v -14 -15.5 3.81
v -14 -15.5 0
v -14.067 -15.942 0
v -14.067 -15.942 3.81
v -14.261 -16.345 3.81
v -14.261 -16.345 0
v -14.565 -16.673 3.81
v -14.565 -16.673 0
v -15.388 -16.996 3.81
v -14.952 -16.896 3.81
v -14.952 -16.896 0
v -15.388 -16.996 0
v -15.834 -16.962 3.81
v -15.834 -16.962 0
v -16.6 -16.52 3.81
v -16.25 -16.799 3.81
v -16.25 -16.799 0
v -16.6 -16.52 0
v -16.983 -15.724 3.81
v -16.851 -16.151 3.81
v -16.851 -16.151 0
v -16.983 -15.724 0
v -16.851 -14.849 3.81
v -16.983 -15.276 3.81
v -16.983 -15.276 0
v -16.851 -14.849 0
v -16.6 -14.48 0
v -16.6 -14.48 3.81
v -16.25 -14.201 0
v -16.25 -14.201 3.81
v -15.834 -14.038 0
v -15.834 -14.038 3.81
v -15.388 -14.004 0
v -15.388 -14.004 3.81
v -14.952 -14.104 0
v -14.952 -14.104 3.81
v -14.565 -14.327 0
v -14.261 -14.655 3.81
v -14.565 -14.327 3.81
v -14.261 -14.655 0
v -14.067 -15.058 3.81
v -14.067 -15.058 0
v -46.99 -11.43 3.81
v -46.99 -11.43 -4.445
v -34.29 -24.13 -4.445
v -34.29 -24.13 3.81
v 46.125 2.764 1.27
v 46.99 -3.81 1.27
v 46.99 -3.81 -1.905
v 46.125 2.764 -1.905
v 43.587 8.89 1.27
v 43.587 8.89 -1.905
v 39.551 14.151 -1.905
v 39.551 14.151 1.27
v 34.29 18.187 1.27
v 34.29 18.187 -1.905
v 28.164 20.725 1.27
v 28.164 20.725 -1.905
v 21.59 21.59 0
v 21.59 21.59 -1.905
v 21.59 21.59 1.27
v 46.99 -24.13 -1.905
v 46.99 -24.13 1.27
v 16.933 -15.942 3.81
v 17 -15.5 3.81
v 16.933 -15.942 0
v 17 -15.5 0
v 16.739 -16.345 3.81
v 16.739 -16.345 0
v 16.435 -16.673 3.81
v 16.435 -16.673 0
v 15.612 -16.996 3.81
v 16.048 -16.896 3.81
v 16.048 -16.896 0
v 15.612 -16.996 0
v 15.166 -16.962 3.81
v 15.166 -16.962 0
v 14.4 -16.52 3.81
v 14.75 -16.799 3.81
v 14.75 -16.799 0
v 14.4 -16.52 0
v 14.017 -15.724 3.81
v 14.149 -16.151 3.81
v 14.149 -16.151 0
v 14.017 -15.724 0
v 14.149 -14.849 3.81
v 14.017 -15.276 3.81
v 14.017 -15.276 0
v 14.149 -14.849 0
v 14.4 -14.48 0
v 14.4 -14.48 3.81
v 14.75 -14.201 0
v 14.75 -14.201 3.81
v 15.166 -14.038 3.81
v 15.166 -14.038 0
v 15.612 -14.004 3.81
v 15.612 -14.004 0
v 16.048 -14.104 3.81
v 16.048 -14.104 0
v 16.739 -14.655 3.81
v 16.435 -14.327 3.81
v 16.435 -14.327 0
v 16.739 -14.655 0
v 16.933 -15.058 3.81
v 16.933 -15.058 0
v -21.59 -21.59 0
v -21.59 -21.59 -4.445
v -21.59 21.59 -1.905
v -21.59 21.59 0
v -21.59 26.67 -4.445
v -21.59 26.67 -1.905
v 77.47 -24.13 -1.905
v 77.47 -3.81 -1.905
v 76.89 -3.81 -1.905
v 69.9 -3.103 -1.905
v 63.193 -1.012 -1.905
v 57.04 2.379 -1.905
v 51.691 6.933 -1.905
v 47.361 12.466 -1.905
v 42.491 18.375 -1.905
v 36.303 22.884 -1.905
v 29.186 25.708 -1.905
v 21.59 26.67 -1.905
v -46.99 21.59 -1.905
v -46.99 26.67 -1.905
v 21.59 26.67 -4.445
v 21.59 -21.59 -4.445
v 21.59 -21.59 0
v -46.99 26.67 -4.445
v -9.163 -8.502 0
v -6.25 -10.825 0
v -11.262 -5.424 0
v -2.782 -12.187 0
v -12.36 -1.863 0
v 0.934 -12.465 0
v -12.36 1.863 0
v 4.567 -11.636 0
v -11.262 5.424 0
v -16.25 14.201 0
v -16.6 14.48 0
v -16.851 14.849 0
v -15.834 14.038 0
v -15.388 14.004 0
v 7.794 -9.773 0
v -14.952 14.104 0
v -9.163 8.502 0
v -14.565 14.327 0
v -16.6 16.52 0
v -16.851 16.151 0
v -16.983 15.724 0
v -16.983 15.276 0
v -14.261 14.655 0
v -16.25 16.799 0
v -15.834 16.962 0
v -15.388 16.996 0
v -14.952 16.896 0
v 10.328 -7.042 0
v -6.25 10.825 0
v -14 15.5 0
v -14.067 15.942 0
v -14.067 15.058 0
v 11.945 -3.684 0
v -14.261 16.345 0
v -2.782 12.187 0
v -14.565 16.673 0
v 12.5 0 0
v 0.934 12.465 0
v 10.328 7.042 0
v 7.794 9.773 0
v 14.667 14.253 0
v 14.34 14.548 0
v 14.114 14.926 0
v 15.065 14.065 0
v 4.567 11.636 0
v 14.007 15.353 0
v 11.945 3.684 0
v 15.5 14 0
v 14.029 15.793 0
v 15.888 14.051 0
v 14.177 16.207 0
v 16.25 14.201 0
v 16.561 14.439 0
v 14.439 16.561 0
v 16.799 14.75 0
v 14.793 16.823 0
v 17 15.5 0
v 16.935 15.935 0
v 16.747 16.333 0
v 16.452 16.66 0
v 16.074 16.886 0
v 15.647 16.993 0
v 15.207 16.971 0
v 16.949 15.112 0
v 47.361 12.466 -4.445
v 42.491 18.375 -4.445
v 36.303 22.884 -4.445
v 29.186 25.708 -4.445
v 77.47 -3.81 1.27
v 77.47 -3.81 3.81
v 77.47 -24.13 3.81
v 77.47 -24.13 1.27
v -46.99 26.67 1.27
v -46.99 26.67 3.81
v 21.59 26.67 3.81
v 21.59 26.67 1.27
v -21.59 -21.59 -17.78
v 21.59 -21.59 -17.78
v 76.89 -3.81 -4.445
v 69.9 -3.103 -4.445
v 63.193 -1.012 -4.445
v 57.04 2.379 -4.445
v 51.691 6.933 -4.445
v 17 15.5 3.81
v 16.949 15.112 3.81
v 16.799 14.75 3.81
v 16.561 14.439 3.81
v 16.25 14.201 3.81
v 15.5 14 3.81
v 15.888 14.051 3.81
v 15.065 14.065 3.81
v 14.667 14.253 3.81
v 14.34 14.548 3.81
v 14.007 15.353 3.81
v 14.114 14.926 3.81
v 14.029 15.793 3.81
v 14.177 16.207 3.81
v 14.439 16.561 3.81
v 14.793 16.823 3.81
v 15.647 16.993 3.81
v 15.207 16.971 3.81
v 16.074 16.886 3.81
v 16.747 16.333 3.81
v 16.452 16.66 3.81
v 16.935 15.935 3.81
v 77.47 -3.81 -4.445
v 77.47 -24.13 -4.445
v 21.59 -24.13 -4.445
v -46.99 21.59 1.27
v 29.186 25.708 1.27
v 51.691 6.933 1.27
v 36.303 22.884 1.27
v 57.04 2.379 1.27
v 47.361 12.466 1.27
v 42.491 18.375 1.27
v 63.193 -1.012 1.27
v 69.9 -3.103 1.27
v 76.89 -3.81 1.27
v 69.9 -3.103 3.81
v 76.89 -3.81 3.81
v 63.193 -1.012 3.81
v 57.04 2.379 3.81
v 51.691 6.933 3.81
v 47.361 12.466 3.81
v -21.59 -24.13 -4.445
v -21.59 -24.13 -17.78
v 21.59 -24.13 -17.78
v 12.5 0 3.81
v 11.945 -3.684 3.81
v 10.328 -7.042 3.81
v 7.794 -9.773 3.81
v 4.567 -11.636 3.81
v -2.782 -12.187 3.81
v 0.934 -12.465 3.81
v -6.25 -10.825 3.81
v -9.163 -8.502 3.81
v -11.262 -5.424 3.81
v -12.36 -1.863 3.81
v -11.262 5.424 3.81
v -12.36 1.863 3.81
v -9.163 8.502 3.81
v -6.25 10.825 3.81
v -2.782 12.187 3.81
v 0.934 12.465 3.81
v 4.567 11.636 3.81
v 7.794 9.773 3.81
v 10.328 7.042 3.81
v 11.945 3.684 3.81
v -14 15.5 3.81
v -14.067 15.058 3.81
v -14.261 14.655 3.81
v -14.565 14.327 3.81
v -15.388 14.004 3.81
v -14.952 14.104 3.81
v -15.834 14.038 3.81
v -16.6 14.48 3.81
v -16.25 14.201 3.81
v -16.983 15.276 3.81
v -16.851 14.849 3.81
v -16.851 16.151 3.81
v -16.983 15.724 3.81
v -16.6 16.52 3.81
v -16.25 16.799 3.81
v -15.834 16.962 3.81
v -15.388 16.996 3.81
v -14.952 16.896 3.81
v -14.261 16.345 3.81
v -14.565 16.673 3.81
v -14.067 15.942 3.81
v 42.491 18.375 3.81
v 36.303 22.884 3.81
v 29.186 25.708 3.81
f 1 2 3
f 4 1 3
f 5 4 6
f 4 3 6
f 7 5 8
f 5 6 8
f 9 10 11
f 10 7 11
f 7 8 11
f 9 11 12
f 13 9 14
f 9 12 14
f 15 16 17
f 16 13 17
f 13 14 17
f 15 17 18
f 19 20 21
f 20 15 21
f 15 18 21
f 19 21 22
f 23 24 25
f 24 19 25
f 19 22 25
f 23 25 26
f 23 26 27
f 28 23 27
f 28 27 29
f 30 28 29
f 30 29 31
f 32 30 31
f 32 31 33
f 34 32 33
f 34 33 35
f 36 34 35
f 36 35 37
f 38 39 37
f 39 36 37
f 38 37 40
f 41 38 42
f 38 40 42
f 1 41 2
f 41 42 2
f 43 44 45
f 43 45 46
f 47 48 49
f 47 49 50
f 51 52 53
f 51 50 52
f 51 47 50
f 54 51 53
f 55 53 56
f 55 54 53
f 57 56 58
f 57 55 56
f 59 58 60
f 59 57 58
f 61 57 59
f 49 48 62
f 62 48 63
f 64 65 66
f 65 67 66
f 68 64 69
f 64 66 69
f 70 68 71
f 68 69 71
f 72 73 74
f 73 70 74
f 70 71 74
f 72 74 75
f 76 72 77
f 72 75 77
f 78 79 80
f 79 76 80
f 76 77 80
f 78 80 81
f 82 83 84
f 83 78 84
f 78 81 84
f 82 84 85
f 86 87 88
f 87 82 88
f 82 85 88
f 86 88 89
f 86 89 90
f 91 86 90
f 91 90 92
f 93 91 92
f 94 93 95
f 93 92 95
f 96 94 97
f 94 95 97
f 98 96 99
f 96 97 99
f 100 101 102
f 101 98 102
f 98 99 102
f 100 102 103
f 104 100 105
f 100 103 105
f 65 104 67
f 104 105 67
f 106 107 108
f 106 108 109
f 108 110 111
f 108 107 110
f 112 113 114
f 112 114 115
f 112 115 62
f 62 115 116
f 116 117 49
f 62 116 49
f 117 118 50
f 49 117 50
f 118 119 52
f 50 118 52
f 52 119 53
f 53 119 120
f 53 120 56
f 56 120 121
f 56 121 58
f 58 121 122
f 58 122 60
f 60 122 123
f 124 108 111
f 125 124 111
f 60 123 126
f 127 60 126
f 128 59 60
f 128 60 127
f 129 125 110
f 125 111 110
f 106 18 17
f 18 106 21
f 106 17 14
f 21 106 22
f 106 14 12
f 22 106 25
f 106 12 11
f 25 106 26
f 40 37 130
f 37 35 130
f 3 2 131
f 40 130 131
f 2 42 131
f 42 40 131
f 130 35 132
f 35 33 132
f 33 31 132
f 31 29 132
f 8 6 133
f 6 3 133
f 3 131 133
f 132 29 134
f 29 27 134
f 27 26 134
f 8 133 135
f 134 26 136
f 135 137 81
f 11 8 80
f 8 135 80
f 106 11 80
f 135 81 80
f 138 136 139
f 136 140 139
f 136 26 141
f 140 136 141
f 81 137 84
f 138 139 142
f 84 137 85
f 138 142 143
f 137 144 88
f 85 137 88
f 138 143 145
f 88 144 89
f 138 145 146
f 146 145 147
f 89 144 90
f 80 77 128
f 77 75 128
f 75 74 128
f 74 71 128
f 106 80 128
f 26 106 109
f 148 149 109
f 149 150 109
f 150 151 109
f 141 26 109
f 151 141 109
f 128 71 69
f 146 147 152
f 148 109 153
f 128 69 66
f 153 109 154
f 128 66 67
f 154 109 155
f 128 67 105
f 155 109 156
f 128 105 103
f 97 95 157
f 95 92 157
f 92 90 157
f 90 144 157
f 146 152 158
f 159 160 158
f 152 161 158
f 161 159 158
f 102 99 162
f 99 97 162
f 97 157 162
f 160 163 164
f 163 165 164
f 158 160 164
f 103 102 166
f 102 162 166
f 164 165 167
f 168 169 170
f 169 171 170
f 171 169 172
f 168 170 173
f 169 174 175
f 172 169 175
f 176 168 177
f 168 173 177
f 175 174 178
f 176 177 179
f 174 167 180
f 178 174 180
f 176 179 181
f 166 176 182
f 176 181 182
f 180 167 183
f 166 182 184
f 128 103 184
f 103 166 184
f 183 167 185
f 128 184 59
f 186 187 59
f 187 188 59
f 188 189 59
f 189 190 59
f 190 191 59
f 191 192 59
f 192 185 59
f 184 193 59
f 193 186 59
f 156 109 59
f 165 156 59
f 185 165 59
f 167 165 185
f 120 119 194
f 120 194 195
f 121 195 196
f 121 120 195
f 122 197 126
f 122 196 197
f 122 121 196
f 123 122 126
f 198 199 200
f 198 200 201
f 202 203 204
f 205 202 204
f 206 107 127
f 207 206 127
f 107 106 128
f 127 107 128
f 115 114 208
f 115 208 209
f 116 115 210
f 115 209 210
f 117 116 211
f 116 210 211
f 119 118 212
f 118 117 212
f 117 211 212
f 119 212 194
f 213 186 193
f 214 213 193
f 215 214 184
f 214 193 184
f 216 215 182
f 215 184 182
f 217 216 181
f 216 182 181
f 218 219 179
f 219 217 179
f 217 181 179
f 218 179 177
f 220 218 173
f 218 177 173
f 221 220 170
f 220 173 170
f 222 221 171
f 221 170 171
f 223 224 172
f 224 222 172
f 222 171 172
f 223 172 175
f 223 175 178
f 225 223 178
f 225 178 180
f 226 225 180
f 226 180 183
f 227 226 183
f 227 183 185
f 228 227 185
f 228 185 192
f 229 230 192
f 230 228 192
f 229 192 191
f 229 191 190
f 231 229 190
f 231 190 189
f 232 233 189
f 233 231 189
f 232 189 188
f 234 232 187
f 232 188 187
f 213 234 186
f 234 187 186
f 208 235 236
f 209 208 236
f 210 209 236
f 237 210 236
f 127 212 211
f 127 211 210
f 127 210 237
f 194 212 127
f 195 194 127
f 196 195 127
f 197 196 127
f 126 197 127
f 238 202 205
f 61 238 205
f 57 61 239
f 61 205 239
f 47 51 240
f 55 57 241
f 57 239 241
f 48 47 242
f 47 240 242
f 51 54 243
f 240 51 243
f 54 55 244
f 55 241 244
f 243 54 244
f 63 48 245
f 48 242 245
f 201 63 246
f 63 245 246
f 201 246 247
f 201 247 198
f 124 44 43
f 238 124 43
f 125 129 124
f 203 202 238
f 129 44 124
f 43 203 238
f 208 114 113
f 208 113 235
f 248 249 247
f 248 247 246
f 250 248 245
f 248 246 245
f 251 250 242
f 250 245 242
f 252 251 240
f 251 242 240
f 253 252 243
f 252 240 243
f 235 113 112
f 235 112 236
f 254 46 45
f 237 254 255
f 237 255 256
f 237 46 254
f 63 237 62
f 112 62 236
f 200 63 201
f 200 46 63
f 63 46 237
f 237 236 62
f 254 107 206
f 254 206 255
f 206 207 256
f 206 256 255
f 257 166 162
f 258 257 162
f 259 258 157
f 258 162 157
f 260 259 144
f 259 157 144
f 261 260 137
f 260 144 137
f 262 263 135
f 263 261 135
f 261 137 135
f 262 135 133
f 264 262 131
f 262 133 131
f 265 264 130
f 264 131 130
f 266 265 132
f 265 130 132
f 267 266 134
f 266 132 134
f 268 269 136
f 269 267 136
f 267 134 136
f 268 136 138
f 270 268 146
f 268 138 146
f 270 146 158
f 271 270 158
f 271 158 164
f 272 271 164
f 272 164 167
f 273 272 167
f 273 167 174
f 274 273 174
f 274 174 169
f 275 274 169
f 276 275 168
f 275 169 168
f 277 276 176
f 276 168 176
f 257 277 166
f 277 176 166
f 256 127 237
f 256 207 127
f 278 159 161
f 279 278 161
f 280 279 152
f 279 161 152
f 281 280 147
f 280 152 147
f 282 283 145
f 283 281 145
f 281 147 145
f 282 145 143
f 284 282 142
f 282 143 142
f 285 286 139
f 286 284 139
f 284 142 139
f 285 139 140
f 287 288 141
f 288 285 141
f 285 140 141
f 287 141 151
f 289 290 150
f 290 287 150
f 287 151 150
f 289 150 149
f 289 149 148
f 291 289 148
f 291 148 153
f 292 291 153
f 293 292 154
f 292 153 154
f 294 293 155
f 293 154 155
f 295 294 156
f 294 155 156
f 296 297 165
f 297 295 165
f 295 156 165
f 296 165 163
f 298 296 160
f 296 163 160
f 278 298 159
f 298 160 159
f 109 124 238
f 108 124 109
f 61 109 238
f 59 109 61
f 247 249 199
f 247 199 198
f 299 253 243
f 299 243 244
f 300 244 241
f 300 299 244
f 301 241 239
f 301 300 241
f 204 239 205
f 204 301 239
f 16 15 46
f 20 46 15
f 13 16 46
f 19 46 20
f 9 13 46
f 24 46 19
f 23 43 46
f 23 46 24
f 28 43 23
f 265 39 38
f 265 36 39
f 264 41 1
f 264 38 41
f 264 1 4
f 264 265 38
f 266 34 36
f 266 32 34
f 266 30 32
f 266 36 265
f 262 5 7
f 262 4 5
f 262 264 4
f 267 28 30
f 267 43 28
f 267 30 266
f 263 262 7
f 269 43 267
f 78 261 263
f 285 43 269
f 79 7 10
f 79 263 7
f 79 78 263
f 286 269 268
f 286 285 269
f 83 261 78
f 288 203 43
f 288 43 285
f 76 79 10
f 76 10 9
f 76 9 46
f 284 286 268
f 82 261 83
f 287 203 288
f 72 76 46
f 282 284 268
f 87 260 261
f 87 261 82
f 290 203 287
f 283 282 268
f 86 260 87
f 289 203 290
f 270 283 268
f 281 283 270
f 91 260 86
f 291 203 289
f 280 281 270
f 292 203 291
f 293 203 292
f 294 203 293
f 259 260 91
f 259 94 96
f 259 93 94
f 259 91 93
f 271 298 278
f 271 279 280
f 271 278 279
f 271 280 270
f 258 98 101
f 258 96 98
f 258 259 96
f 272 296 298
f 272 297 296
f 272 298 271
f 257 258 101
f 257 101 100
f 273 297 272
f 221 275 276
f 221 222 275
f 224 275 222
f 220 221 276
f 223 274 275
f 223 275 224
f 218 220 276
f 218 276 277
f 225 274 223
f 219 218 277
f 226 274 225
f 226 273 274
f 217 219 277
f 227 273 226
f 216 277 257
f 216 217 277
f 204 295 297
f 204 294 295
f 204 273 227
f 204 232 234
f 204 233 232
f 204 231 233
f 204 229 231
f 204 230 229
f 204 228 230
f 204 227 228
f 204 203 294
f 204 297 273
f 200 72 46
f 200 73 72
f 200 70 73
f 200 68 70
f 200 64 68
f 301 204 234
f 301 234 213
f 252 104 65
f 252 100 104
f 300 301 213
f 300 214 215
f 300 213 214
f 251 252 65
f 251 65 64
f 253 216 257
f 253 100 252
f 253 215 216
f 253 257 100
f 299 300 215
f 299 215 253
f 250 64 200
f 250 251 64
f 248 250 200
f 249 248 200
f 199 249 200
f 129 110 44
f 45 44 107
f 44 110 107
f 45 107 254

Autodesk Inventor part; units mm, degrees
ref_plane "YZ Plane" through (0, 0, 0) normal (1, 0, 0) x (0, 1, 0)
ref_plane "XZ Plane" through (0, 0, 0) normal (0, 1, 0) x (-1, 0, 0)
ref_plane "XY Plane" through (0, 0, 0) normal (0, 0, 1) x (1, 0, 0)
sketch "Sketch1" plane through (0, 0, 0) normal (0, 0, 1) x (1, 0, 0)
  circle A0 centre (0, 0) radius 12.5
  line L0 (0, 0) -> (15.5, 0)
  line L1 (0, 0) -> (15.5, 0) construction
  line L2 (15.5, 0) -> (15.5, 15.5)
  circle A1 centre (15.5, 15.5) radius 1.5
  circle A2 centre (-15.5, 15.5) radius 1.5
  circle A3 centre (15.5, -15.5) radius 1.5
  circle A4 centre (-15.5, -15.5) radius 1.5
  line L3 (21.59, -21.59) -> (-21.59, -21.59)
  line L4 (-21.59, -21.59) -> (-21.59, 21.59)
  line L5 (-21.59, 21.59) -> (21.59, 21.59)
  line L6 (21.59, 21.59) -> (21.59, -21.59)
  line L7 (21.59, -21.59) -> (-21.59, 21.59) construction
  line L8 (-21.59, -21.59) -> (21.59, 21.59) construction
  dimension "d0" = 25
  dimension "d1" = 15.5
  dimension "d2" = 0
  dimension "d3" = 15.5
  dimension "d4" = 3
  dimension "d7" = 31
  dimension "d10" = 31
  dimension "d13" = 43.18
  dimension "d14" = 43.18
extrude "Extrusion1" add sketch "Sketch1" along normal blind 3.81
sketch "Sketch2" plane through (-21.59, -21.59, 0) normal (0, -1, 0) x (1, 0, 0)
  line L0 (0, 3.81) -> (43.18, 3.81) projected
  line L1 (0, 3.81) -> (43.18, 3.81)
  line L2 (43.18, 3.81) -> (43.18, -17.78)
  line L3 (43.18, -17.78) -> (0, -17.78)
  line L4 (0, -17.78) -> (0, 3.81)
  point P0 (21.59, 0)
  dimension "d17" = 21.59
extrude "Extrusion2" add sketch "Sketch2" along normal blind 2.54
sketch "Sketch3" plane through (0, 0, 3.81) normal (0, 0, 1) x (1, 0, 0)
  line L0 (-21.59, 21.59) -> (21.59, 21.59) projected
  circle A0 centre (0, 0) radius 12.5 projected
  circle A1 centre (-15.5, -15.5) radius 1.5 projected
  circle A2 centre (15.5, -15.5) radius 1.5 projected
  circle A3 centre (-15.5, 15.5) radius 1.5 projected
  circle A4 centre (15.5, 15.5) radius 1.5 projected
  line L1 (21.59, 21.59) -> (21.59, -24.13) projected
  line L2 (21.59, 21.59) -> (-21.59, 21.59) projected
  line L3 (-21.59, 21.59) -> (-21.59, -24.13) projected
  line L4 (21.59, -24.13) -> (-21.59, -24.13) projected
  line L5 (-21.59, 26.67) -> (21.59, 26.67)
  arc A5 (52.07, -3.81) -> (21.59, 26.67) centre (21.59, -3.81) ccw
  line L6 (52.07, -3.81) -> (52.07, -24.13)
  line L7 (-21.59, 26.67) -> (-21.59, 21.59)
  line L8 (-21.59, 21.59) -> (21.59, 21.59)
  line L9 (21.59, 21.59) -> (21.59, -21.59) projected
  line L10 (21.59, 21.59) -> (21.59, -24.13)
  line L11 (21.59, 21.59) -> (21.59, -24.13) projected
  line L12 (21.59, -24.13) -> (52.07, -24.13)
extrude "Extrusion3" add sketch "Sketch3" against normal blind 2.54 contours L7 L5 A5 L6 L12 L1 L0
sketch "Sketch4" plane through (0, 0, 1.27) normal (0, 0, -1) x (-1, 0, 0)
  line L0 (-21.59, 21.59) -> (-21.59, -24.13) projected
  line L1 (-21.59, -24.13) -> (-46.99, -24.13)
  arc A0 (-21.59, 26.67) -> (-52.07, -3.81) centre (-21.59, -3.81) ccw projected
  arc A1 (-21.59, 21.59) -> (-46.99, -3.81) centre (-21.59, -3.81) ccw
  line L2 (-46.99, -3.81) -> (-46.99, -24.13)
  line L3 (-21.59, 21.59) -> (-21.59, -24.13)
  line L4 (-21.59, 21.59) -> (-21.59, -24.13)
  line L5 (-21.59, -24.13) -> (-21.59, 21.59)
  point P0 (0, 0)
  dimension "d26" = 25.4
  dimension "d27" = 5.08
extrude "Extrusion4" add sketch "Sketch4" along normal blind 3.175
sketch "Sketch5" plane through (0, 0, -1.905) normal (0, 0, -1) x (-1, 0, 0)
  line L0 (-46.99, -24.13) -> (-46.99, -3.81) projected
  arc A0 (-21.59, 21.59) -> (-46.99, -3.81) centre (-21.59, -3.81) ccw projected
  line L1 (21.59, 21.59) -> (-21.59, 21.59) projected
  line L2 (21.59, 21.59) -> (21.59, 26.67) projected
  line L3 (21.59, 26.67) -> (-21.59, 26.67) projected
  arc A1 (-21.59, 26.67) -> (-52.07, -3.81) centre (-21.59, -3.81) ccw projected
  line L4 (-52.07, -3.81) -> (-52.07, -24.13) projected
  line L5 (-52.07, -24.13) -> (-46.99, -24.13) projected
  line L6 (-21.59, -21.59) -> (-21.59, -24.13) projected
  line L7 (-21.59, -21.59) -> (-21.59, 21.59) projected
  arc A2 (-21.59, 21.59) -> (-46.99, -3.81) centre (-21.59, -3.81) ccw projected
  line L8 (-46.99, -3.81) -> (-46.99, -24.13) projected
  line L9 (-46.99, -24.13) -> (-21.59, -24.13) projected
  line L10 (21.59, 21.59) -> (-21.59, 21.59) projected
  line L11 (-21.59, 21.59) -> (-21.59, 26.67)
  point P0 (0, 0)
extrude "Extrusion5" add sketch "Sketch5" along normal blind 2.54 contours L5 L4 A1 L11 A0 L0 | L0 A0 L7 L6 L9
sketch "Sketch6" plane through (-21.59, -21.59, 0) normal (-1, 0, 0) x (0, 0, 1)
  line L0 (0, 43.18) -> (0, 0) projected
  line L1 (0, 43.18) -> (-1.905, 43.18) projected
  line L2 (-1.905, 43.18) -> (-1.905, 48.26) projected
  line L3 (-1.905, 48.26) -> (-4.445, 48.26) projected
  line L4 (-4.445, 0) -> (-4.445, 48.26) projected
  line L5 (0, 0) -> (-4.445, 0) projected
  line L6 (1.27, 17.78) -> (1.27, 43.18) projected
  line L7 (0, 0) -> (0, 43.18) projected
  line L8 (-17.78, 0) -> (0, 0) projected
  line L9 (-17.78, 0) -> (-17.78, -2.54) projected
  line L10 (3.81, -2.54) -> (-17.78, -2.54) projected
  line L11 (3.81, 48.26) -> (3.81, -2.54) projected
  line L12 (3.81, 48.26) -> (1.27, 48.26) projected
  line L13 (1.27, 43.18) -> (1.27, 48.26) projected
  line L14 (0, 43.18) -> (1.27, 43.18) projected
  line L15 (-4.445, 0) -> (-17.78, 0) projected
  line L16 (-17.78, -2.54) -> (-4.445, -2.54) projected
  line L17 (-4.445, 0) -> (-4.445, -2.54)
  point P0 (0, 21.59)
extrude "Extrusion6" add sketch "Sketch6" along normal blind 25.4 contours L14 L13 L12 L11 L10 L17 L5 L0 | L0 L5 L4 L3 L2 L1
sketch "Sketch7" plane through (52.07, -24.13, -1.905) normal (1, 0, 0) x (0, 0, -1)
  line L0 (0, 20.32) -> (0, 0) projected
  line L1 (0, 0) -> (2.54, 0) projected
  line L2 (2.54, 20.32) -> (2.54, 0) projected
  line L3 (0, 20.32) -> (2.54, 20.32) projected
  line L4 (-5.715, 0) -> (-5.715, 20.32) projected
  line L5 (-5.715, 0) -> (-3.175, 0) projected
  line L6 (-3.175, 20.32) -> (-3.175, 0) projected
  line L7 (-5.715, 20.32) -> (-3.175, 20.32) projected
  point P0 (-1.905, 24.13)
extrude "Extrusion7" add sketch "Sketch7" along normal blind 25.4
fillet "Fillet1" radius 34.925 2 edges at (52.07, -3.81, 2.54) (52.07, -3.81, -3.175)
chamfer "Chamfer1" distance 12.7 angle 45 1 edges at (-46.99, -24.13, -0.3175)
properties part number "RemoteExtruderV4"
